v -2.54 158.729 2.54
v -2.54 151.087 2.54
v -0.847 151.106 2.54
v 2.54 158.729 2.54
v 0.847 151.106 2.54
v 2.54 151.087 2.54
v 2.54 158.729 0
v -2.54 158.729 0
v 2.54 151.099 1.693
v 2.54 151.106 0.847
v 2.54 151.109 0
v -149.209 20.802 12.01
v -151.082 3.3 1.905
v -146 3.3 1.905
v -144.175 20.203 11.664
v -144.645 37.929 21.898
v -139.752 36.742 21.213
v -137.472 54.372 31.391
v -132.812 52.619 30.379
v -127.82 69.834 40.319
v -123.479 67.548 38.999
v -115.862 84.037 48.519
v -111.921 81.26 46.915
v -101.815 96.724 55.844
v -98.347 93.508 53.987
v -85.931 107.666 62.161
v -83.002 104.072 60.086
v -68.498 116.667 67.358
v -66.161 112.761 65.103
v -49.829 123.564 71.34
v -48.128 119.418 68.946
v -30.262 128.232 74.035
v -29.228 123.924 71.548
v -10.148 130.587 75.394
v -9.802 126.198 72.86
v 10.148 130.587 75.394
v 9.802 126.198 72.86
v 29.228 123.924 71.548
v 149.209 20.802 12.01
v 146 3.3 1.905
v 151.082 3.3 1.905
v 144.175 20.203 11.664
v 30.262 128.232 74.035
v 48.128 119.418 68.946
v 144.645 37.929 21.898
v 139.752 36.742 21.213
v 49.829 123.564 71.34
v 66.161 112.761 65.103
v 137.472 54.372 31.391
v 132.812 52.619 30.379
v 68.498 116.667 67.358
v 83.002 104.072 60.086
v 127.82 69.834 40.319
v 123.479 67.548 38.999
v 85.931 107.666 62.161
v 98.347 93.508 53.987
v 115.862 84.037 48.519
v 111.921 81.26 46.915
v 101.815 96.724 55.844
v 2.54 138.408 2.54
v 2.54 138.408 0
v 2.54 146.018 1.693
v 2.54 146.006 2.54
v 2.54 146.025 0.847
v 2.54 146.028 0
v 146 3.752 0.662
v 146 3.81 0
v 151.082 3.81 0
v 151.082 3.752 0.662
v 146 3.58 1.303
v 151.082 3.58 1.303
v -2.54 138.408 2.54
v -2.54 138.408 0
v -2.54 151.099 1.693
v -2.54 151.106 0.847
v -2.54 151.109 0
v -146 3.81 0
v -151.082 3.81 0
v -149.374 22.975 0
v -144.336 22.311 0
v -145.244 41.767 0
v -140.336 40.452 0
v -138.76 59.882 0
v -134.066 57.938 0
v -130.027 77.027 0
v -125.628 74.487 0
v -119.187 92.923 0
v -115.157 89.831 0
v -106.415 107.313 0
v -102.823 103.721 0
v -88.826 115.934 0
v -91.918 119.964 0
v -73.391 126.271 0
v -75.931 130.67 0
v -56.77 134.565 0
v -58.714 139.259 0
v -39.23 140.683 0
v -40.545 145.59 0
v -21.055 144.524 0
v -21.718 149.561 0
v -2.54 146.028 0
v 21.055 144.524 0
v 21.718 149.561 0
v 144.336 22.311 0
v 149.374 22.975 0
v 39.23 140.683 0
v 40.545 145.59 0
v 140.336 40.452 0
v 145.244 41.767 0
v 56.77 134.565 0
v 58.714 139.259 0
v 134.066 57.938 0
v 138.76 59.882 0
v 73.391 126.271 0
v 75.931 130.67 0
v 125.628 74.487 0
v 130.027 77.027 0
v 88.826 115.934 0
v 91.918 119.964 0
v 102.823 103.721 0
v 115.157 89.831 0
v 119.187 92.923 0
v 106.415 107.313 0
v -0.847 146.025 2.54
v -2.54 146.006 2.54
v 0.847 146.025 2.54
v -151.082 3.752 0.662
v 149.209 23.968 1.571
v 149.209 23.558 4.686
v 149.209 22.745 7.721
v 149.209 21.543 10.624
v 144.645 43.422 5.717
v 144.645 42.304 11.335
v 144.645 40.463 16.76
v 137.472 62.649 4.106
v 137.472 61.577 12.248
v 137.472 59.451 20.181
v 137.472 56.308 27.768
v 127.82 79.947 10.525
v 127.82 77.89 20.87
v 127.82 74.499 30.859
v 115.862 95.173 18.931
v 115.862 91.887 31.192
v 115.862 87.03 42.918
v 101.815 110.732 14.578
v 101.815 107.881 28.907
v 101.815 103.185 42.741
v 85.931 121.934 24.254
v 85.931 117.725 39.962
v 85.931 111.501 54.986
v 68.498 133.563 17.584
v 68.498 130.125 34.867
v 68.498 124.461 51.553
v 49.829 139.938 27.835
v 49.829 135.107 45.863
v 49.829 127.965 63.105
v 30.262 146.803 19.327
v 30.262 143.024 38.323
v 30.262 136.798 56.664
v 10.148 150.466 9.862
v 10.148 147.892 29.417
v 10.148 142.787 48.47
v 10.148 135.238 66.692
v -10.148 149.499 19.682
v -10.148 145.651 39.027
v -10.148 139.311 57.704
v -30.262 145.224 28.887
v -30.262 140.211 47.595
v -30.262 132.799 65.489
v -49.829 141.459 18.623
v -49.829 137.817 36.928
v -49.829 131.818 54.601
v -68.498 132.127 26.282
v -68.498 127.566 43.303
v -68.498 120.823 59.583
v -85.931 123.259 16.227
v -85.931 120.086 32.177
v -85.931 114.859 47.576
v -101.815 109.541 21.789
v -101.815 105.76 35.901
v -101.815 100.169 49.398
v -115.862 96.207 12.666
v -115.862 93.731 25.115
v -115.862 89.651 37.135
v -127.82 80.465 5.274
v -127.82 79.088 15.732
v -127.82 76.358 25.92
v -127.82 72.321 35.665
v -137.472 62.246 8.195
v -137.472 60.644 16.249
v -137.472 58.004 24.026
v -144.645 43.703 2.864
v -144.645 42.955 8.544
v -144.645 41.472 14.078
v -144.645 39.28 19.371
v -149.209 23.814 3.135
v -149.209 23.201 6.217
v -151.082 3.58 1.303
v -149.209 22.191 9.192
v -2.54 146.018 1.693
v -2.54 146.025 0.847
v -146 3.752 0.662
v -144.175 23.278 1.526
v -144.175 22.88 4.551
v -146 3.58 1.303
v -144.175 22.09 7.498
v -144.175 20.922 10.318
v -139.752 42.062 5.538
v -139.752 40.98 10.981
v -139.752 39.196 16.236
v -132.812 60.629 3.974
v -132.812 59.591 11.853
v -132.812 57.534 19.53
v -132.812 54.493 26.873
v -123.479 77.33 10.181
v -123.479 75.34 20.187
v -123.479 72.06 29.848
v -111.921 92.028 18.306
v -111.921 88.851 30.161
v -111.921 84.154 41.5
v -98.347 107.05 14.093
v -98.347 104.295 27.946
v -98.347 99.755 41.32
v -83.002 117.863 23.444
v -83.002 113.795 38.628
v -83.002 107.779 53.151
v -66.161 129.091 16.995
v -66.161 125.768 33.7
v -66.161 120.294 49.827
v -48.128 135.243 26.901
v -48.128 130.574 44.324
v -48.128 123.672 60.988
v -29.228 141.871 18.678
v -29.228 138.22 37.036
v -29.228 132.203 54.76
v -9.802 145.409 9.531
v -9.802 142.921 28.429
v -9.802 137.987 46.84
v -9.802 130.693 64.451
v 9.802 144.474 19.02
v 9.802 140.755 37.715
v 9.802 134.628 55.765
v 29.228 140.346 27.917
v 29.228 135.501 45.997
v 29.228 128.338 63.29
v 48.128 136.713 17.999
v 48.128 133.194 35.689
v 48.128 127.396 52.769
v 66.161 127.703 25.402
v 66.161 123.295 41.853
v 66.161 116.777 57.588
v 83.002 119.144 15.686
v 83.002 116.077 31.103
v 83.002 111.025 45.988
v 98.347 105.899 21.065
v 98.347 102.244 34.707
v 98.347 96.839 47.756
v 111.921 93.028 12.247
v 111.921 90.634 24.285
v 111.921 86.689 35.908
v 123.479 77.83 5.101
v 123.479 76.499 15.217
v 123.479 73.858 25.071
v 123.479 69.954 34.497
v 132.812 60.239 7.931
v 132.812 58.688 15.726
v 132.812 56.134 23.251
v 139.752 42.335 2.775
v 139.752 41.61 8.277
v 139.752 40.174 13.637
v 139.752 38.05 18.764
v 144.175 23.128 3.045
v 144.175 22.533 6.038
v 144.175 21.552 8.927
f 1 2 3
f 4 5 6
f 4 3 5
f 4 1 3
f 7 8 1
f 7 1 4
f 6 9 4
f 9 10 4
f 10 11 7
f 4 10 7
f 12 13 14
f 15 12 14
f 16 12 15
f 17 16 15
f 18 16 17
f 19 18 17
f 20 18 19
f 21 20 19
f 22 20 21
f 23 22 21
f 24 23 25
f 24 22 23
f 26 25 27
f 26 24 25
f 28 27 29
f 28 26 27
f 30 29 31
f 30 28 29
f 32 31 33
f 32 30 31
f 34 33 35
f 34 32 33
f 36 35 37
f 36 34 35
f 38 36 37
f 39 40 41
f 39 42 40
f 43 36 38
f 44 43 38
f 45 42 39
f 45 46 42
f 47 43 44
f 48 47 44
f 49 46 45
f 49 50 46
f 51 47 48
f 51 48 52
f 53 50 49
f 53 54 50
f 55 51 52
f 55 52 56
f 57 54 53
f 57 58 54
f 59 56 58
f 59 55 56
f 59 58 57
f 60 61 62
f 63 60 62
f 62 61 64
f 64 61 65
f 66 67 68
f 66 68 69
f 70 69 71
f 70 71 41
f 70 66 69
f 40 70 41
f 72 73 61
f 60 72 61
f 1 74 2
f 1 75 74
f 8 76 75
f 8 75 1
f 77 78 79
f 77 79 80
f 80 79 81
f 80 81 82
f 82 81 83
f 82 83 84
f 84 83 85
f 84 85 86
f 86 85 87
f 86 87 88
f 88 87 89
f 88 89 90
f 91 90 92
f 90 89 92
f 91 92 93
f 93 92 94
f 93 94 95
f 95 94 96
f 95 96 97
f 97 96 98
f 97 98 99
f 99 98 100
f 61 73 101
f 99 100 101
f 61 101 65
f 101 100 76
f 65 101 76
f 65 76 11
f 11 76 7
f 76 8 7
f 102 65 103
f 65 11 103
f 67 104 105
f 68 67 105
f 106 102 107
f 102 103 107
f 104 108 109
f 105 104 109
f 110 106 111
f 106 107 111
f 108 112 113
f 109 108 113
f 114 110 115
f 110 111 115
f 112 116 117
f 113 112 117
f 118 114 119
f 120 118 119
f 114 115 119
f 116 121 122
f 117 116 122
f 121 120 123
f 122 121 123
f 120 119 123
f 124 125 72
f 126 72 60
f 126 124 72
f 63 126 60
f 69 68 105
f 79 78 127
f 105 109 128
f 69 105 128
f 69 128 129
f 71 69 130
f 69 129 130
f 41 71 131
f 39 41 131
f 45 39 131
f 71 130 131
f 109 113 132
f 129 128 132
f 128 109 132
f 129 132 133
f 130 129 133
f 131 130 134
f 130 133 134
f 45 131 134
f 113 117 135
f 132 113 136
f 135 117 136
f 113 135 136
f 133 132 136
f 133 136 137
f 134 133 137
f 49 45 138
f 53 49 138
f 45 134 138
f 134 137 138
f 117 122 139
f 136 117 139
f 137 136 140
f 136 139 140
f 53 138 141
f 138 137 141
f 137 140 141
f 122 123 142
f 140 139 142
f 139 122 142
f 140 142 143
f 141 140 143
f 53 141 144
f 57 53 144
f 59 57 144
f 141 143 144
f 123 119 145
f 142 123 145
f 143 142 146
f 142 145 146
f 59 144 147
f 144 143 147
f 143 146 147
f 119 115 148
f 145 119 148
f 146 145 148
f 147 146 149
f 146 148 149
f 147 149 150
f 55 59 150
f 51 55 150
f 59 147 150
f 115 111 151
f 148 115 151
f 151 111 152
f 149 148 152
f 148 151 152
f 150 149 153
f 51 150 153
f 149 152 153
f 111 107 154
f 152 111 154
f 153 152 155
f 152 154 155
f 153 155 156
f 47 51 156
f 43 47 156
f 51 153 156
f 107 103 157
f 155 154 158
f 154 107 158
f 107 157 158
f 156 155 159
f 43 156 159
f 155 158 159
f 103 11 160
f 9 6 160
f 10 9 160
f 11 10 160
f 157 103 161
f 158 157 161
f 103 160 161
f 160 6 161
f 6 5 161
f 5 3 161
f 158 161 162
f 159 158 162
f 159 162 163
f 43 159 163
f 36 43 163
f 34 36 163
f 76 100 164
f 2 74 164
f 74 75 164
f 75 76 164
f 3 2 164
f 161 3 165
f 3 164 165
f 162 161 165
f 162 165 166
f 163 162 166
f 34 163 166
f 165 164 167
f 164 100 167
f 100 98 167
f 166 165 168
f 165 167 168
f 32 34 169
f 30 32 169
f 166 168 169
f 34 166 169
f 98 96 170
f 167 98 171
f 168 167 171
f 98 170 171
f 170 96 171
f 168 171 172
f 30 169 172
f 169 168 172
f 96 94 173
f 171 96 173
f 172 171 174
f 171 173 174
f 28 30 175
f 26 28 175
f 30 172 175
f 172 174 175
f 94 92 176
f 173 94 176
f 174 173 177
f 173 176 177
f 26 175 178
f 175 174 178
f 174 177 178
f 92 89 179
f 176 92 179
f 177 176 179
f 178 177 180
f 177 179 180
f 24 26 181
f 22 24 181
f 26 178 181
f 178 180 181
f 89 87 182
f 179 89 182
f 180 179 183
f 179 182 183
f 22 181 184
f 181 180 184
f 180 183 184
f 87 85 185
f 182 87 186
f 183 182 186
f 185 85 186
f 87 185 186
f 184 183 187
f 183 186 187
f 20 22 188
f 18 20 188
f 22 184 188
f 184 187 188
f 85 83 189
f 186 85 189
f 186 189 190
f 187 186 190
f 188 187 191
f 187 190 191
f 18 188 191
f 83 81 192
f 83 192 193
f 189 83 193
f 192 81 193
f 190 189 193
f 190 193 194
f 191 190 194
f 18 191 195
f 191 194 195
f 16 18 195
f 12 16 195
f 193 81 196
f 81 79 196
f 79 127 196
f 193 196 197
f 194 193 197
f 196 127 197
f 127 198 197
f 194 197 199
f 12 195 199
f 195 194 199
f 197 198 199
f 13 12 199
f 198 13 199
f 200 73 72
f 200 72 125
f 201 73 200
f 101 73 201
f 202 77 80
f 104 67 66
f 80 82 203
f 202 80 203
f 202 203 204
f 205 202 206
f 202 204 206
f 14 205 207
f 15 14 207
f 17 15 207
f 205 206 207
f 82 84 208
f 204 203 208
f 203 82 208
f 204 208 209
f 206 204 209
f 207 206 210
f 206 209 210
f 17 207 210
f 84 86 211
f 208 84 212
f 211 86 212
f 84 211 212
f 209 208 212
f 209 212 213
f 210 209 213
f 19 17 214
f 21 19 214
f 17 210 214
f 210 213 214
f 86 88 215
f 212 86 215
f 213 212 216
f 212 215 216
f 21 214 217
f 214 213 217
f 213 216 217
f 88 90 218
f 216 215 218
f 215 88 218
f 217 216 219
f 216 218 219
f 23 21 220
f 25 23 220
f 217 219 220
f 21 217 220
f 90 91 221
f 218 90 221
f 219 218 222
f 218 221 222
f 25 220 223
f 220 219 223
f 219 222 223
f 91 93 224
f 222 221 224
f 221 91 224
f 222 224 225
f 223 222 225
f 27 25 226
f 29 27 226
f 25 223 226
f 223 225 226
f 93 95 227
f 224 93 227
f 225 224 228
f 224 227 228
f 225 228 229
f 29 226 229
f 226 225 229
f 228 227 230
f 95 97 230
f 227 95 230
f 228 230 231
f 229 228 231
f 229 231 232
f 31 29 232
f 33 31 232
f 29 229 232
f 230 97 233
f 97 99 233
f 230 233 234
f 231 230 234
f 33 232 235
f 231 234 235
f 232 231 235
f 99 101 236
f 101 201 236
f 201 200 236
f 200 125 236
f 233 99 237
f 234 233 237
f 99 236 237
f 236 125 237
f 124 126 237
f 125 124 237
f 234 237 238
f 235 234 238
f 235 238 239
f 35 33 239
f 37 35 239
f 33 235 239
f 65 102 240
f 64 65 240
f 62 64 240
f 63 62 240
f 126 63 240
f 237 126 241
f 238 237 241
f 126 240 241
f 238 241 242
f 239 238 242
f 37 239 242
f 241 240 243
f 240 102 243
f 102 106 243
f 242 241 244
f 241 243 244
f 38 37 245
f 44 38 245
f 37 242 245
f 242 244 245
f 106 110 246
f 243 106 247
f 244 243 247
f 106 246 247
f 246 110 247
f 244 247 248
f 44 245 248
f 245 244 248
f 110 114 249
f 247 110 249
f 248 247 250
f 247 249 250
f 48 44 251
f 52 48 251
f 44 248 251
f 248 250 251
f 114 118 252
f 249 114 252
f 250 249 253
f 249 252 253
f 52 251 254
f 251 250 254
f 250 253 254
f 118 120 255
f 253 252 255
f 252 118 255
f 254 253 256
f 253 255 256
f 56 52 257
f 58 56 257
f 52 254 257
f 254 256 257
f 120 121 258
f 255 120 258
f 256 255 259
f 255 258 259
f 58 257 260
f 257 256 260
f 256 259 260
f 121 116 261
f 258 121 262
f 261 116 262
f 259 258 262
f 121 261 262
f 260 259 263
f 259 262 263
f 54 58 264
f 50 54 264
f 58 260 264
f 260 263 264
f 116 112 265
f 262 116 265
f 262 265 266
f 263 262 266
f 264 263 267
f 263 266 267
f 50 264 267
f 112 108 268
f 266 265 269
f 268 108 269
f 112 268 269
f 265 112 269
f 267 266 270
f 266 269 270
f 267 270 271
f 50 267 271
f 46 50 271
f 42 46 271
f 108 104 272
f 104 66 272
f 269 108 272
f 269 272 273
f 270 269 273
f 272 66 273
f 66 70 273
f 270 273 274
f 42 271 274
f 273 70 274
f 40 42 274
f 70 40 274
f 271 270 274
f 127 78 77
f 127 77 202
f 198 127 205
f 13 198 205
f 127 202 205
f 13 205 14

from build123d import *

# Parameters (mm, degrees)
F1_ANGLE      = 30
F2_R          = 3.81
F3_DEPTH      = 151.131
F3_DEPTH_BACK = 151.131
F4_W          = 5.08
F4_H          = 20.3206839475
F5_DEPTH      = 2.54


with BuildPart() as f1:
    # F0 (on Top) → F1 (revolve)
    with BuildSketch(Plane.XY):
        with BuildLine():
            Line((-151.13, 0), (-146.05, 0))
            ThreePointArc((-146.05, 0), (0, 146.05), (146.05, 0))
            Line((146.05, 0), (151.13, 0))
            ThreePointArc((151.13, 0), (0, 151.13), (-151.13, 0))
        make_face()
    revolve(axis=Axis((-73.025, 0, 0), (1, 0, 0)), revolution_arc=F1_ANGLE)

    # F2 (on Right) → F3 (cut, two sides)
    with BuildSketch(Plane.YZ) as f3_sk:
        Circle(F2_R)
    extrude(amount=-F3_DEPTH, mode=Mode.SUBTRACT)
    extrude(f3_sk.sketch, amount=F3_DEPTH_BACK, mode=Mode.SUBTRACT)

    # F4 (on Top) → F5 (join)
    with BuildSketch(Plane.XY):
        with Locations((0, 148.5682533469)):
            Rectangle(F4_W, F4_H)
    extrude(amount=F5_DEPTH)


solid = f1.part
